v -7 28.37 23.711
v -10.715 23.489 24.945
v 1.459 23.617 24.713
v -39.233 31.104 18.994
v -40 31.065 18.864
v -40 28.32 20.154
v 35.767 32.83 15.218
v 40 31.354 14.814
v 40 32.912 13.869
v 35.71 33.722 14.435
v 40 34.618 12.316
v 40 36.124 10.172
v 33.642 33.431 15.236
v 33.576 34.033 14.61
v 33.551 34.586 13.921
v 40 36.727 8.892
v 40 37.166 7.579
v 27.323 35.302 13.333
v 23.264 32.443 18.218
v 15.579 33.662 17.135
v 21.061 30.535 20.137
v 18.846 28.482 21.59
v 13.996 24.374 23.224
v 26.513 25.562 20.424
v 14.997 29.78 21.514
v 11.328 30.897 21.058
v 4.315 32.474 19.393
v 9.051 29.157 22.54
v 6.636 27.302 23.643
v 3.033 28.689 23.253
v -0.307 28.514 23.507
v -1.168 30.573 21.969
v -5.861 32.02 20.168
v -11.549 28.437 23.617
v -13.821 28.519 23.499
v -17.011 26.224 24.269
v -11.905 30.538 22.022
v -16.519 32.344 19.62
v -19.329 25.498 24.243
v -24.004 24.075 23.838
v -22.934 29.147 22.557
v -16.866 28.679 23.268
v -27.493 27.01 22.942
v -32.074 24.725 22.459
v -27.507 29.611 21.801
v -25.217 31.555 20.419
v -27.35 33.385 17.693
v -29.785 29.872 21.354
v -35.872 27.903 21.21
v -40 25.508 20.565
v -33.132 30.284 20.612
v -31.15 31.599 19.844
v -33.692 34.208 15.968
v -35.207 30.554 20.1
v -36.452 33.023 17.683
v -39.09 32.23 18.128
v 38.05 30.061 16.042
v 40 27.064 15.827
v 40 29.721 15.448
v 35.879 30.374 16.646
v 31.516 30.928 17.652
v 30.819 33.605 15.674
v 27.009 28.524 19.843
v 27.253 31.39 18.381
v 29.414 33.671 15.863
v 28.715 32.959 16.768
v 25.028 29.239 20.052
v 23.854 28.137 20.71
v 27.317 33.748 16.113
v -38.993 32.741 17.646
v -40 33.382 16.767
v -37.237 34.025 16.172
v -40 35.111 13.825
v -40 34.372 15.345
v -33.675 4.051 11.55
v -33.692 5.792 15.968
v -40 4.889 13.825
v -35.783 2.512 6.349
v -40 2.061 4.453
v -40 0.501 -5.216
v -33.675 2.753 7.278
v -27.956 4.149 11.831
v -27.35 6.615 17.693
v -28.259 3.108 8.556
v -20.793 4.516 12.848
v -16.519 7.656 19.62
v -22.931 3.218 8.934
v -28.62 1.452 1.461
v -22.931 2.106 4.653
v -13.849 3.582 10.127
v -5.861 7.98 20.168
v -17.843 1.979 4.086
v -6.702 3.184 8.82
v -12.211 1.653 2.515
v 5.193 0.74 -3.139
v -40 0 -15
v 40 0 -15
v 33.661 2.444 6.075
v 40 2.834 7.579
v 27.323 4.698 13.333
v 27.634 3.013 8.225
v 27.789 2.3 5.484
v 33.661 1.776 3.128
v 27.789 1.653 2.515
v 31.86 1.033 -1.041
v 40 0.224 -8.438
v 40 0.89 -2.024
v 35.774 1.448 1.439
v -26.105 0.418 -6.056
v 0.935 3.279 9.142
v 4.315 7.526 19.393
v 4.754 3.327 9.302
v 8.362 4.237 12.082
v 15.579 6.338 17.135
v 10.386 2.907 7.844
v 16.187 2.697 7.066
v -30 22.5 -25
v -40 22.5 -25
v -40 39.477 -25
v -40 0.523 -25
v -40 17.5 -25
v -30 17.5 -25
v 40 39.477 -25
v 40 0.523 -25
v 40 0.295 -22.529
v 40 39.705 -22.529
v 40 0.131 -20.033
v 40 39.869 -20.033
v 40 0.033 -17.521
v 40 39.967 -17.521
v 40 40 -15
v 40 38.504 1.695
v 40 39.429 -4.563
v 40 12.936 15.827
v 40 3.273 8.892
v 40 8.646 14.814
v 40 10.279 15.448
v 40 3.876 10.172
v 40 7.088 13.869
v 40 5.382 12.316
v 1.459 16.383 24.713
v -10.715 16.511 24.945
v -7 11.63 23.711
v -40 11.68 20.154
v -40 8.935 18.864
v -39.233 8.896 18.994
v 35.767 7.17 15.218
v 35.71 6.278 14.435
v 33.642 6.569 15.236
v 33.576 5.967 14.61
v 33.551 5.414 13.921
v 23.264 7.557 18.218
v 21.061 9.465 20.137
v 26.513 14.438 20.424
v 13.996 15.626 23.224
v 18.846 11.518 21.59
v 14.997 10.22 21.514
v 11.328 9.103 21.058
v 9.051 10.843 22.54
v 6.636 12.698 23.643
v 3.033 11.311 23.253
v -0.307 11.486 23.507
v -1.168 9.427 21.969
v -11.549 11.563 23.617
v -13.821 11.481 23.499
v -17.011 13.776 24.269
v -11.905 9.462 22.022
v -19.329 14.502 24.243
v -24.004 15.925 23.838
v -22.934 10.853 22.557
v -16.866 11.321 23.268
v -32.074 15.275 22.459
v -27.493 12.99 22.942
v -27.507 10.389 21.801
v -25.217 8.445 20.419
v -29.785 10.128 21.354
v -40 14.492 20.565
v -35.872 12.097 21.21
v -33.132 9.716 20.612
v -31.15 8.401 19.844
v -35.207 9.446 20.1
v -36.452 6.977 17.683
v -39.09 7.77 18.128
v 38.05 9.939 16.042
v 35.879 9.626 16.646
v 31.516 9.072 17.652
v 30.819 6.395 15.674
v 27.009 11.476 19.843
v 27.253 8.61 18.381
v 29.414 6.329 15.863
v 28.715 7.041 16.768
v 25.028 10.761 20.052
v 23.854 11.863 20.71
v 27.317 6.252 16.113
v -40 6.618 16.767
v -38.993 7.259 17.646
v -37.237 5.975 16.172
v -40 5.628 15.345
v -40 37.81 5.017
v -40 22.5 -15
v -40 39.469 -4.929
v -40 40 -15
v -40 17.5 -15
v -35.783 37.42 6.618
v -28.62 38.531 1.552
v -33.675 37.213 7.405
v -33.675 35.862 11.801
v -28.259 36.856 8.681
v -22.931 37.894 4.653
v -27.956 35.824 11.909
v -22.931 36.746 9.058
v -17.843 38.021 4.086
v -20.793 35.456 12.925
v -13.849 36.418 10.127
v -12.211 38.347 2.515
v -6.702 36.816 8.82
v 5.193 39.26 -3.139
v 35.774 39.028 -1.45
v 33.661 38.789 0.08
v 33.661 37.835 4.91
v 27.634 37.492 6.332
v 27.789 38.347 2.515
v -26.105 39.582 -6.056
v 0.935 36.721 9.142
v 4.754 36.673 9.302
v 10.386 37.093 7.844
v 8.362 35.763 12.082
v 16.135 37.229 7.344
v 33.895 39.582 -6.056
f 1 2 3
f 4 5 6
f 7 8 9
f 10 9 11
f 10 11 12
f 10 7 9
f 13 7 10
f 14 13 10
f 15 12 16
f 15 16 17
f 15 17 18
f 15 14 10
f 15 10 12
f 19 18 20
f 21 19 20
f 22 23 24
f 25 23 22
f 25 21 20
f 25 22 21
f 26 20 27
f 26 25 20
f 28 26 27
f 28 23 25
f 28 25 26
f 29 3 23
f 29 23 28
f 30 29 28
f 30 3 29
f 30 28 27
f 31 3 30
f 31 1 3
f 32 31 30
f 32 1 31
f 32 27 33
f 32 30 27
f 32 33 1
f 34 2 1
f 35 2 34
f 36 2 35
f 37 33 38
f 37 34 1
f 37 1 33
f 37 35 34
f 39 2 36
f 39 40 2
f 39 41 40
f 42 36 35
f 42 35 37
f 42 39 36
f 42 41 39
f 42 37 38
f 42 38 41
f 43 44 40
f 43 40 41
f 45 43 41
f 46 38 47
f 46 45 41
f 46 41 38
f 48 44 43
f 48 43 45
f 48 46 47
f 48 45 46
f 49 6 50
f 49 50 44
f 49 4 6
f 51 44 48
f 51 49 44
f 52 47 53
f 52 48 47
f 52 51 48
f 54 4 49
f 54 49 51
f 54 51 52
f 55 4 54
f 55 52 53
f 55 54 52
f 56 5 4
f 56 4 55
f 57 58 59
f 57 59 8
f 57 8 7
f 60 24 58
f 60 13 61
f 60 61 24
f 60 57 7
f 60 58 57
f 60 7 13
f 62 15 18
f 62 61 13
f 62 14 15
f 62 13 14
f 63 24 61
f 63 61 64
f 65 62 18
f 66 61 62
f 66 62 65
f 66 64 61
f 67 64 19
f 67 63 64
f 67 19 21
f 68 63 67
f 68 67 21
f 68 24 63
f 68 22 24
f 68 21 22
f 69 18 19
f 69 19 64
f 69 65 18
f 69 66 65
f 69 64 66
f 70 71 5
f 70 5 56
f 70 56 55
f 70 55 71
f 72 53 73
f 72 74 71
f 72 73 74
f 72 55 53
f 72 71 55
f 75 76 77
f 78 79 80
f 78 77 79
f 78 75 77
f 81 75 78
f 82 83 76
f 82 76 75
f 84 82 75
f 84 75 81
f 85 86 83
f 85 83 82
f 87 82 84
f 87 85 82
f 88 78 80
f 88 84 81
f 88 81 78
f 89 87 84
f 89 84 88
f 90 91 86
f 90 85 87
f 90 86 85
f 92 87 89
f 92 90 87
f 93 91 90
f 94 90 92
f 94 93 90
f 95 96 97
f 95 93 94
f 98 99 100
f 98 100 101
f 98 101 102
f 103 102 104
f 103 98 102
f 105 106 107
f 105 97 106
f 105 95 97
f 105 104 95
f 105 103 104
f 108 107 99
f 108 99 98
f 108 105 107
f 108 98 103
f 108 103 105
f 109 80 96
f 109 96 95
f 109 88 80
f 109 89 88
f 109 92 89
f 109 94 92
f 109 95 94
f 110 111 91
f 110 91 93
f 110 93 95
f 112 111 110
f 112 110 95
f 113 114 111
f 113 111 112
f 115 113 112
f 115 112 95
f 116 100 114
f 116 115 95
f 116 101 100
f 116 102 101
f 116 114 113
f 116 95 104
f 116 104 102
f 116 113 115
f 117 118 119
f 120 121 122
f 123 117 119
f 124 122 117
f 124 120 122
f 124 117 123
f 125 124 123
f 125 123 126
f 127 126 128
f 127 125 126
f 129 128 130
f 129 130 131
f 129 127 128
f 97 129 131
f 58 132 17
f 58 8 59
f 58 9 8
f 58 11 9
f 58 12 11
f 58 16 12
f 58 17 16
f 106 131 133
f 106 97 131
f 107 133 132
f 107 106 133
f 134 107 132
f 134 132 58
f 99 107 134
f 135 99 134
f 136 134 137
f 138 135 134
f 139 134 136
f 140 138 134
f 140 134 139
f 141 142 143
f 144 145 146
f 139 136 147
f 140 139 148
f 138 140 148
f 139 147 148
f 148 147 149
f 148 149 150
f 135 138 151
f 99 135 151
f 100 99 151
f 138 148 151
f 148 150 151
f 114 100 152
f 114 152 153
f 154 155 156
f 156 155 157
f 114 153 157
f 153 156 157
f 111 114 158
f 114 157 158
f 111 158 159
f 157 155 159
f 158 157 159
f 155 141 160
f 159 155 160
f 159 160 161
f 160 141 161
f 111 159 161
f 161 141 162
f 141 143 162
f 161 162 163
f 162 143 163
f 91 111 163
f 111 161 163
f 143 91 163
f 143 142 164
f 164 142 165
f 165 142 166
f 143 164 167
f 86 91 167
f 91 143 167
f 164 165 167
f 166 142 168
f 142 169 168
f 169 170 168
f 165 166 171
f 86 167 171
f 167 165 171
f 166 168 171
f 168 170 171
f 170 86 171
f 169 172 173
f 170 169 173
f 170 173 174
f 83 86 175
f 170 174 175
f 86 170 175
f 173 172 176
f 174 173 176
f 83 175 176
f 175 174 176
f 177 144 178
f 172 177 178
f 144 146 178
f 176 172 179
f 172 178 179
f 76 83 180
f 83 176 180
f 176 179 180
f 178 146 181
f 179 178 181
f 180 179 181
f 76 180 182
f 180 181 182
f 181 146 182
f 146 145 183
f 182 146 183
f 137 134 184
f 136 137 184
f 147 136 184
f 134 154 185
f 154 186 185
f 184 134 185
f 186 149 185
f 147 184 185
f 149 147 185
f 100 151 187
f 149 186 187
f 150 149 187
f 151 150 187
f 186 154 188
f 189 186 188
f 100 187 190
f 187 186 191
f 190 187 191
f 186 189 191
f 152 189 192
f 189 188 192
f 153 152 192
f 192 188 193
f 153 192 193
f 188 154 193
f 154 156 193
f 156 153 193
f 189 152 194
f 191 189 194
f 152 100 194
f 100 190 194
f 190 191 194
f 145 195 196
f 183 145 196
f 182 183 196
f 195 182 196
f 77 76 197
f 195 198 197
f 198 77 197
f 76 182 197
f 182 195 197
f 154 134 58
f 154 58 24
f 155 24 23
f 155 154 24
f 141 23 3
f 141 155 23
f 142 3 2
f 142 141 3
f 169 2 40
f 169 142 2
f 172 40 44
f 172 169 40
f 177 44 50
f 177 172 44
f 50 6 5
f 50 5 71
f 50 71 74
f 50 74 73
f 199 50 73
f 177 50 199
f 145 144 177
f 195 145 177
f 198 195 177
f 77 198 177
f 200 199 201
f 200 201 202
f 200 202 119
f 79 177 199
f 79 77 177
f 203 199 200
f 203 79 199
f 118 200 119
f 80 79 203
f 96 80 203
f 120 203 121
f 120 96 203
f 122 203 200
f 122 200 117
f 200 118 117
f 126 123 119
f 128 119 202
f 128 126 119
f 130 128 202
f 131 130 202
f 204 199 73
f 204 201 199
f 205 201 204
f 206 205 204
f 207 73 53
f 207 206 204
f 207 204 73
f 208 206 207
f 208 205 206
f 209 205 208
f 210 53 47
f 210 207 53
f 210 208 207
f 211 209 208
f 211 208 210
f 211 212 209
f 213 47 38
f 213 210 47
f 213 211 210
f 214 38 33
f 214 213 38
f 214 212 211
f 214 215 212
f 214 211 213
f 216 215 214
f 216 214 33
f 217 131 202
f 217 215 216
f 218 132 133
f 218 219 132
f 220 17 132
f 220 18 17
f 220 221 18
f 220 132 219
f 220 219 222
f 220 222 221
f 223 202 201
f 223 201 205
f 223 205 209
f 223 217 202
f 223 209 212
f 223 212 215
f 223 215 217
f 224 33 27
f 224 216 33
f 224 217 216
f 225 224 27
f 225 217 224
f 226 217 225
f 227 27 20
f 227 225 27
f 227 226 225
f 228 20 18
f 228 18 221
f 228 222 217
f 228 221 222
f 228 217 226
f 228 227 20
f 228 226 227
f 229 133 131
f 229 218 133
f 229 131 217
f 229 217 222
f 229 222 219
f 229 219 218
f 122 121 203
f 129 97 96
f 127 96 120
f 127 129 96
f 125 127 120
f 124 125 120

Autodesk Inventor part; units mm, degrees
ref_plane "YZ Plane" through (0, 0, 0) normal (1, 0, 0) x (0, 1, 0)
ref_plane "XZ Plane" through (0, 0, 0) normal (0, 1, 0) x (-1, 0, 0)
ref_plane "XY Plane" through (0, 0, 0) normal (0, 0, 1) x (1, 0, 0)
sketch "スケッチ1" plane through (0, 0, 0) normal (0, 1, 0) x (-1, 0, 0)
  line L0 (-40, 25) -> (40, 25)
  line L1 (40, 25) -> (40, -25)
  line L2 (40, -25) -> (-40, -25)
  line L3 (-40, -25) -> (-40, 25)
  line L4 (-40, 25) -> (40, -25) construction
  line L5 (40, 25) -> (-40, -25) construction
  circle A0 centre (7, -100) radius 125
  line L6 (40, -15) -> (30, -25)
  point P0 (0, 0)
  point P1 (40, 20.5653)
  point P2 (-40, 15.8275)
  dimension "d0" = 80
  dimension "d1" = 50
  dimension "d2" = 7
  dimension "d3" = 250
  dimension "d6" = 10
  dimension "d7" = 10
extrude "押し出し1" add sketch "スケッチ1" along normal blind 40 contours A0 L1 L6 L2 L3 | L1 L2 L6
ref_plane "作業平面1" through (0, 17.5, 0) normal (0, 1, 0) x (1, 0, 0)
sketch "スケッチ2" plane through (0, 17.5, 0) normal (0, 1, 0) x (1, 0, 0)
  line L0 (40, -15.8275) -> (40, 25) projected
  line L1 (40, 25) -> (-40, 25) projected
  line L2 (-40, 25) -> (-40, -20.5653) projected
  arc A0 (-40, -20.5653) -> (40, -15.8275) centre (-7, 100) ccw projected
  line L3 (-40, 15) -> (-30, 25)
  line L4 (40, 25) -> (-40, 25) projected
  point P0 (0, 0)
  dimension "d11" = 10
  dimension "d12" = 45
extrude "押し出し2" cut sketch "スケッチ2" along normal blind 5 contours L3 L2 L1
sketch "スケッチ3" plane through (40, 0, 15.8275) normal (1, 0, 0) x (0, 0, -1)
  line L0 (-9.1725, 0) -> (-9.1725, 40) projected
  line L1 (0, 0) -> (40.8275, 0) projected
  line L2 (0, 0) -> (-9.1725, 0) projected
  line L3 (0, 40) -> (-9.1725, 40) projected
  line L4 (0, 40) -> (40.8275, 40) projected
  line L5 (40.8275, 0) -> (40.8275, 40) projected
  line L6 (40.8275, 20) -> (-7.81, 20)
  ellipse E0 centre (30.8275, 20) end of major axis (-13.1725, 20) minor radius 20
  point P0 (15.8275, 0)
  point P1 (-4.7379, 0)
  point P2 (-4.7379, 40)
  point P3 (-9.1725, 28.332)
  point P4 (30.8275, 40)
  point P5 (40.8275, 39.4766)
  point P6 (30.8275, 0)
  point P7 (-9.1725, 11.668)
  point P8 (40.8275, 0.5234)
  dimension "d15" = 44
  dimension "d16" = 10
extrude "押し出し3" cut sketch "スケッチ3" against normal through all contours L0 E0 L1 L2 | L0 L3 L4 E0 | E0 L5 L1 | L4 L5 E0
fillet "フィレット2" radius 10 4 edges at (16.84, 9.6918, 22.7056) (-23.6437, 10.6425, 23.887) (16.84, 30.3082, 22.7056) (-23.6437, 29.3575, 23.887)
